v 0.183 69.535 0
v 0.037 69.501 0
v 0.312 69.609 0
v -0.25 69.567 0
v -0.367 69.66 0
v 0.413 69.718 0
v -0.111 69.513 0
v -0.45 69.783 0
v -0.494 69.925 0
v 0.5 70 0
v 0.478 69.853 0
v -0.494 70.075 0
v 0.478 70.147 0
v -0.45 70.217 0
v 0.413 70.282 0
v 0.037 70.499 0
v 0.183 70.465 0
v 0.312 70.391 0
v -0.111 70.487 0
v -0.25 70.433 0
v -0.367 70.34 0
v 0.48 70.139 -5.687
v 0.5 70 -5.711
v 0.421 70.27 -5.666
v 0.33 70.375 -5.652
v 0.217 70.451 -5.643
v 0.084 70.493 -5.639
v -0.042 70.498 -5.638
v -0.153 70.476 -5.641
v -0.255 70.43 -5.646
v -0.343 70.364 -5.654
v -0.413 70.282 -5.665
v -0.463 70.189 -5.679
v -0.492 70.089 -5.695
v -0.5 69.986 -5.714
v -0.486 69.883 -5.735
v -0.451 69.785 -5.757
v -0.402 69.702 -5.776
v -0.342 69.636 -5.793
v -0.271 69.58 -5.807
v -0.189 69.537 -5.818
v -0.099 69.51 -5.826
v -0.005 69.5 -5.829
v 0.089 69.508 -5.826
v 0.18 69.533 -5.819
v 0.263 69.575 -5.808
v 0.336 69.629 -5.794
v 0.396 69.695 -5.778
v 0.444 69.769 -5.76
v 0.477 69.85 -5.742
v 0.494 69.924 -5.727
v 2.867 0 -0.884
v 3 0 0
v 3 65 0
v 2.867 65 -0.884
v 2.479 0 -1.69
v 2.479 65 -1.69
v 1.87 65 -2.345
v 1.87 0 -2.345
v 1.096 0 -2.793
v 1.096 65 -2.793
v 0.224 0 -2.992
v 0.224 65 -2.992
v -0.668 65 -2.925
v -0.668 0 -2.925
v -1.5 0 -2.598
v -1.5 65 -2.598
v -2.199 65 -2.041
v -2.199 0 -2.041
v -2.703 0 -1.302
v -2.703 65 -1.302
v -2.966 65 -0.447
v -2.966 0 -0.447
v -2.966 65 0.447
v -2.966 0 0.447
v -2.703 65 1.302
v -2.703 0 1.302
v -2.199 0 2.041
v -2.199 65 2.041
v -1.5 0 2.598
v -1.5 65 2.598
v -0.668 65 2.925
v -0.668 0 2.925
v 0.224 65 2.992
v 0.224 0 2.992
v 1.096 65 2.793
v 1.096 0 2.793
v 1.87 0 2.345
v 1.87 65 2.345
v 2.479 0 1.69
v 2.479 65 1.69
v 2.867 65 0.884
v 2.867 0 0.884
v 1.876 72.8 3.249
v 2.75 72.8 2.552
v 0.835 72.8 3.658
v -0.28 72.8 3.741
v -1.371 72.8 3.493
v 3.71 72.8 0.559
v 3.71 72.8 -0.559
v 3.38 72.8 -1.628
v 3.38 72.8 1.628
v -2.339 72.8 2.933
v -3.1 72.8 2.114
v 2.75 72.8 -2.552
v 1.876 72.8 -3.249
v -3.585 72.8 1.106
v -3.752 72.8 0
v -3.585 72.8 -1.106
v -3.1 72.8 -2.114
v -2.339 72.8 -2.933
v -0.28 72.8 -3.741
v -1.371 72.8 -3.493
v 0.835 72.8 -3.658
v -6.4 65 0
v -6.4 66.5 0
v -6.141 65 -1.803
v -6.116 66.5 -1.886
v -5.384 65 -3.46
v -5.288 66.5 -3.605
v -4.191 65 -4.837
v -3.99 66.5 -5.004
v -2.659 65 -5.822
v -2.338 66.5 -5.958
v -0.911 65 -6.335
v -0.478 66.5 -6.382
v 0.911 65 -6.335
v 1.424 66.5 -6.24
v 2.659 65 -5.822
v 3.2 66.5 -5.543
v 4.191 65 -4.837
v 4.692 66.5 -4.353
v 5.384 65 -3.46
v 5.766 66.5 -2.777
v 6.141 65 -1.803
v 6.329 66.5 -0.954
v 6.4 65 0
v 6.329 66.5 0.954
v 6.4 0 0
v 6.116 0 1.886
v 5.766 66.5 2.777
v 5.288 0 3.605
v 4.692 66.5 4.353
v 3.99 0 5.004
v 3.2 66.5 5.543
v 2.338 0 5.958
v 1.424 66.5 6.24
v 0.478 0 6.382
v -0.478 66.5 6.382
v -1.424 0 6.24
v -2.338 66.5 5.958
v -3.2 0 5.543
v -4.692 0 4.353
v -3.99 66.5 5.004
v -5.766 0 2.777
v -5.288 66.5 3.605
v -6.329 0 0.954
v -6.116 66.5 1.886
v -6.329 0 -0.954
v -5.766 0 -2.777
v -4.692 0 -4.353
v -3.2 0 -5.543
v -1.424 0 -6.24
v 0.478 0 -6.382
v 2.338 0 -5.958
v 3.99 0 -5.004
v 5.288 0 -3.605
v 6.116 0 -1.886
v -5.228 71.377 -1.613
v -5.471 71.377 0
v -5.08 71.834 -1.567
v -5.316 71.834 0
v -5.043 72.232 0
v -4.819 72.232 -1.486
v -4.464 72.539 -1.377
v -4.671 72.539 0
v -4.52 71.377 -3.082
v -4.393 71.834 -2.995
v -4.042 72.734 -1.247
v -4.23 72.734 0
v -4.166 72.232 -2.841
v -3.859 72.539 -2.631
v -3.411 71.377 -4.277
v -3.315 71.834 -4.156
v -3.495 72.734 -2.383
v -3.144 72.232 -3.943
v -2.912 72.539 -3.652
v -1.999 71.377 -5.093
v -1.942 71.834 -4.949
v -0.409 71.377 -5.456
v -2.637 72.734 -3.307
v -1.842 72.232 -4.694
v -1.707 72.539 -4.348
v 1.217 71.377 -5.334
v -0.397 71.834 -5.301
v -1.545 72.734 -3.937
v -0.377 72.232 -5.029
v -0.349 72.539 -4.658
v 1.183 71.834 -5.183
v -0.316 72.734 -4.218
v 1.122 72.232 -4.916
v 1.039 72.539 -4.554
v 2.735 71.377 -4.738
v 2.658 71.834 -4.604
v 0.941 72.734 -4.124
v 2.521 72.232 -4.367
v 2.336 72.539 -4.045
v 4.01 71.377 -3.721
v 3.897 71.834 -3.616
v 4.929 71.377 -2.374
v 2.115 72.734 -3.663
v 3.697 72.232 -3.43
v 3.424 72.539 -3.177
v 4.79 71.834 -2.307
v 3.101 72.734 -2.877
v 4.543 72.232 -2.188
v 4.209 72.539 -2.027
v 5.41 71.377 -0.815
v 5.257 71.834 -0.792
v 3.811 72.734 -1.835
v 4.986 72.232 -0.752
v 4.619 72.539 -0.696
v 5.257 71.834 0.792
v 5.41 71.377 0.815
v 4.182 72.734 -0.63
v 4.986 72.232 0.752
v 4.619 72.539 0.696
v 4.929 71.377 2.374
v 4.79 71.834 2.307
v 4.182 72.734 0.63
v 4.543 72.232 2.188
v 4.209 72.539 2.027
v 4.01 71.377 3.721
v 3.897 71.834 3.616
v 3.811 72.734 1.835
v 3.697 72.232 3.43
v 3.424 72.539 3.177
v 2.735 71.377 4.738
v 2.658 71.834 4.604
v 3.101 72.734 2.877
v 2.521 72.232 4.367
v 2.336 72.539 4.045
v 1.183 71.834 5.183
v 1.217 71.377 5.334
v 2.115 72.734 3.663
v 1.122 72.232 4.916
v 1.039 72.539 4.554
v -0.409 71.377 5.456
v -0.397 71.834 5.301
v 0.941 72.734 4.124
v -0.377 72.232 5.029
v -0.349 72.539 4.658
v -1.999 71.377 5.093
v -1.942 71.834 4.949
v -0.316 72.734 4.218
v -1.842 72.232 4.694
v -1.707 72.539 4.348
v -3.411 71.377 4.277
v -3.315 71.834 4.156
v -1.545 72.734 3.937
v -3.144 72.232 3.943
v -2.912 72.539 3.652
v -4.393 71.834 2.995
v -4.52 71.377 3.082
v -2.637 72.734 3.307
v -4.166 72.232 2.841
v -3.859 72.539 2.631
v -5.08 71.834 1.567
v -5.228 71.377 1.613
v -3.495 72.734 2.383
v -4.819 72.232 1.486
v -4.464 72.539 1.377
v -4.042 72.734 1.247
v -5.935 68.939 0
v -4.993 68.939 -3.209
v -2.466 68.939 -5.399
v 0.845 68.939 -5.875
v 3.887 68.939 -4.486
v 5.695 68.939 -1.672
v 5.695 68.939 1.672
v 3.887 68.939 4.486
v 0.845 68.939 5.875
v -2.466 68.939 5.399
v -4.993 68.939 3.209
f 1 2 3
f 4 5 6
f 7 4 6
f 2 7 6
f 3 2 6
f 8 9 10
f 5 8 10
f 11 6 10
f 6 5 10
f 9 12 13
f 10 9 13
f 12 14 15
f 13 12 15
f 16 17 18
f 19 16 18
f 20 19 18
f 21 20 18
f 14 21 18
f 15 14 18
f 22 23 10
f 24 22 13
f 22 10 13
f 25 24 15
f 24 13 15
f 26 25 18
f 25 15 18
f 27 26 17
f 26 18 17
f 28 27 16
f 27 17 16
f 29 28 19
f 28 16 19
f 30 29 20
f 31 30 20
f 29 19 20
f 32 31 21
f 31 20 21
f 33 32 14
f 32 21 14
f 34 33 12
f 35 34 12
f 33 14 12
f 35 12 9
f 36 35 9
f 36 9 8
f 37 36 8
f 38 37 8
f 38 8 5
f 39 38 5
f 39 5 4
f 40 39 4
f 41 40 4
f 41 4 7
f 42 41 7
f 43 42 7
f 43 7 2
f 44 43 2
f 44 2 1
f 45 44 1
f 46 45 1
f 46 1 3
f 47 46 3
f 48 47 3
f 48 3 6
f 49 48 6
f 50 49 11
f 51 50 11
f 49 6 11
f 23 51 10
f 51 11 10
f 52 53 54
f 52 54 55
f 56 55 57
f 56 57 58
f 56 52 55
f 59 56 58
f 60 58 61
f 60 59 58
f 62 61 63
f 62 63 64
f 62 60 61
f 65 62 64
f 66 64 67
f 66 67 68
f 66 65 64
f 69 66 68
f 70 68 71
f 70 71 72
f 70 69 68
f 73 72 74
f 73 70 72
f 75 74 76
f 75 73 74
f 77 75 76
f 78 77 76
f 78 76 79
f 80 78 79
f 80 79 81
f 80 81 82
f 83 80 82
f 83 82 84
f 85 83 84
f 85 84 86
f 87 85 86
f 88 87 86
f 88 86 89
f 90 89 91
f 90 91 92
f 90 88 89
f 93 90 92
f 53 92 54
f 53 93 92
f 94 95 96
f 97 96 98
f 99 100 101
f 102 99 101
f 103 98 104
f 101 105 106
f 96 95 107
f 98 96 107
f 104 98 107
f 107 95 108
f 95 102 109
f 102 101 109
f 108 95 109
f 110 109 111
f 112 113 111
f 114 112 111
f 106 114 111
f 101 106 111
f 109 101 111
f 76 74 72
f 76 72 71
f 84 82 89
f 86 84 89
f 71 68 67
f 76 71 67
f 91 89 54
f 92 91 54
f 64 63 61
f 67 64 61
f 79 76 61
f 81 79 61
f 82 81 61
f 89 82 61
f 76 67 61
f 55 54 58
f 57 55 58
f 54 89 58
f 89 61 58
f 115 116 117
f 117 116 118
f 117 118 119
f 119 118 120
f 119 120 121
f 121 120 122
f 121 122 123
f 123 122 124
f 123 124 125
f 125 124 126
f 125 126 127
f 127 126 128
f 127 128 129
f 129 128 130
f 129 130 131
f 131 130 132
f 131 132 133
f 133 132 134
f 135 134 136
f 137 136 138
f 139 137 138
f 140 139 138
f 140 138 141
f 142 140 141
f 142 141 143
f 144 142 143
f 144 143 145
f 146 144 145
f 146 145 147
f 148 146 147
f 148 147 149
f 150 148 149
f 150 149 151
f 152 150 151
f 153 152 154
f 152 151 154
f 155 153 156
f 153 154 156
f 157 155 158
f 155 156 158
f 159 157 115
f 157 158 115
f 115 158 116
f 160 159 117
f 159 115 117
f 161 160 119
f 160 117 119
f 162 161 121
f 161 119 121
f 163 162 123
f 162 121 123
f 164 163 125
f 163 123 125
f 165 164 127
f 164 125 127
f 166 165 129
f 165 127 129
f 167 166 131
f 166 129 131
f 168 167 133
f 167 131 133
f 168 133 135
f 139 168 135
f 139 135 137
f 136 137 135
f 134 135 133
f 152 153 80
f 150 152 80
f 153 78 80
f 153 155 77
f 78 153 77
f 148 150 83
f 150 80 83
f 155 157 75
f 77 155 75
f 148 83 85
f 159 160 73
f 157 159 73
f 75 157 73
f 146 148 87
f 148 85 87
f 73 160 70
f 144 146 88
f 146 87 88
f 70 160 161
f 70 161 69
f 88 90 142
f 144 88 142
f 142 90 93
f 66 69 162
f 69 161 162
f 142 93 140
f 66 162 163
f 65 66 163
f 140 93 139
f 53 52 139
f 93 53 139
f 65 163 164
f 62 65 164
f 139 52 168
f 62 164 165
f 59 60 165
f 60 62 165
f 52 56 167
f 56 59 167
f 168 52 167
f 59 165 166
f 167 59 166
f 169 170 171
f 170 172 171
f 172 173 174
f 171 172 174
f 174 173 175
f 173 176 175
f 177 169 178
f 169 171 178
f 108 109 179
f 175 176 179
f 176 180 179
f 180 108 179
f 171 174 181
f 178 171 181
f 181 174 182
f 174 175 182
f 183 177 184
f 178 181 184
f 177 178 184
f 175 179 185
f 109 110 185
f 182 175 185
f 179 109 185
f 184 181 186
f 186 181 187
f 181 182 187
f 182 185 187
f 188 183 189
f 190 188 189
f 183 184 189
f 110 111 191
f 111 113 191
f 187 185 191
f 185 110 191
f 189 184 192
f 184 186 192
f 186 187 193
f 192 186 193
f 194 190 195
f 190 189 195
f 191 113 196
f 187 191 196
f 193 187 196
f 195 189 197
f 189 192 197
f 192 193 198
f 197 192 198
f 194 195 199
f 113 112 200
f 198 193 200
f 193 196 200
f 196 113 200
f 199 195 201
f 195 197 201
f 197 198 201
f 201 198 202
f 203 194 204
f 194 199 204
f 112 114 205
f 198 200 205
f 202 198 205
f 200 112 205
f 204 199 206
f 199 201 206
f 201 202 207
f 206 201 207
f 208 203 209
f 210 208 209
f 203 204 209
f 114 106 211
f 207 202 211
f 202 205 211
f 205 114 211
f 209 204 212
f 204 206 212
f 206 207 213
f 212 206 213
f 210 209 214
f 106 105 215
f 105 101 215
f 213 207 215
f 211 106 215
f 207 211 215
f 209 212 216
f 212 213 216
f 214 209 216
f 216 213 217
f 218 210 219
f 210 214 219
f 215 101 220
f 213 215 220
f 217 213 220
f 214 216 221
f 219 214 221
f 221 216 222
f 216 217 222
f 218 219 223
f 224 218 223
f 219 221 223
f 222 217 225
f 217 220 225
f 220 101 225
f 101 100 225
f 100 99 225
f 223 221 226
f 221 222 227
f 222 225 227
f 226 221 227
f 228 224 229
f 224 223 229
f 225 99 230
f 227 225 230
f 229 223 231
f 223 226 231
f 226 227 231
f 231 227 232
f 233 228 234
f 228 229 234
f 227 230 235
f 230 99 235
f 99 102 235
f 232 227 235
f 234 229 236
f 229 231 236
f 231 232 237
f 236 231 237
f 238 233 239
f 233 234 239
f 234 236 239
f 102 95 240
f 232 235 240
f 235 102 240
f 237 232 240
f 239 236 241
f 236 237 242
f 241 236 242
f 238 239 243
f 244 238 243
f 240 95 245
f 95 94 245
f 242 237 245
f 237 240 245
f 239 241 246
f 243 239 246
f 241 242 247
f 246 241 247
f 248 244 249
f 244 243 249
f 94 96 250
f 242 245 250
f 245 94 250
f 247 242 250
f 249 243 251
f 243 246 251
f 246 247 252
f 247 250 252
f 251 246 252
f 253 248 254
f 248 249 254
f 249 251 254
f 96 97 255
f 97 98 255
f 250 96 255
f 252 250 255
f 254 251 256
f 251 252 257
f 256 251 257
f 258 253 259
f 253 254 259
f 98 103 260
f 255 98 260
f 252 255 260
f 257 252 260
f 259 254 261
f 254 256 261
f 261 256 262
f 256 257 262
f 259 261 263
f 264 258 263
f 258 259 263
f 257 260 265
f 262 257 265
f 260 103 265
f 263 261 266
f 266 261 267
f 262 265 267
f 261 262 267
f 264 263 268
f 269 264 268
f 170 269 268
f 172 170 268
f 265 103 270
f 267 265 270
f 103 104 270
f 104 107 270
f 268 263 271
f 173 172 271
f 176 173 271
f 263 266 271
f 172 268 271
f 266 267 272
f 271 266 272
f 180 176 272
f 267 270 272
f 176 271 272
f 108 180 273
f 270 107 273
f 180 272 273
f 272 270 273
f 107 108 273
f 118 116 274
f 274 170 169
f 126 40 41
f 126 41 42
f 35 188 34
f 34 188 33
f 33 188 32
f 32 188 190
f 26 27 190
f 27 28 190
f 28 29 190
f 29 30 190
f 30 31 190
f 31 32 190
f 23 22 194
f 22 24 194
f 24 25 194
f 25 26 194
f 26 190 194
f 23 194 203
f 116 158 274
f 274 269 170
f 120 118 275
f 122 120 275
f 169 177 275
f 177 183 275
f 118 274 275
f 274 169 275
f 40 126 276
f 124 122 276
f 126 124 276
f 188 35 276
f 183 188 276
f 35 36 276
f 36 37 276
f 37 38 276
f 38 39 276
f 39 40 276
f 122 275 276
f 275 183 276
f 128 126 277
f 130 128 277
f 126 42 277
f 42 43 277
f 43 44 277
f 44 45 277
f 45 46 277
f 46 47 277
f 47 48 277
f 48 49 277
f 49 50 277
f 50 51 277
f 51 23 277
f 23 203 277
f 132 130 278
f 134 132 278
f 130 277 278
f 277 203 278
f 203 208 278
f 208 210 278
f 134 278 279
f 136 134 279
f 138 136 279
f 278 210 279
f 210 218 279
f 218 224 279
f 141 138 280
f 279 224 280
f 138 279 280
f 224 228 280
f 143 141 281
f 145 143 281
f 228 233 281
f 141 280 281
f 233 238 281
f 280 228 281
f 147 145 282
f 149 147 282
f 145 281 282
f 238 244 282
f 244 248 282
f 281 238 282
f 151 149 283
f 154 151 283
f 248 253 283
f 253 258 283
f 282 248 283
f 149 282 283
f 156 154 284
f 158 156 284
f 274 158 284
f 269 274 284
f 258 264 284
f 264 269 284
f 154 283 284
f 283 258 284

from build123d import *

# Parameters (mm, degrees)
SKETCH1_R           = 6.4
SKETCH1_R_2         = 3
BOSS_EXTRUDE2_DEPTH = 65
SKETCH4_R           = 0.5
CUT_EXTRUDE1_DEPTH  = 7.4


with BuildPart() as part:
    # Sketch1 → Boss-Extrude2 (new body)
    with BuildSketch(Plane(origin=(0, 0, 0), x_dir=(1, 0, 0), z_dir=(0, 1, 0))):
        Circle(SKETCH1_R)
        Circle(SKETCH1_R_2, mode=Mode.SUBTRACT)
    extrude(amount=BOSS_EXTRUDE2_DEPTH)

    # Sketch2 → Revolve2 (revolve)
    with BuildSketch(Plane.XY):
        with BuildLine():
            Line((-6.4, 65), (-6.4, 66.5))
            Line((-6.4, 66.5), (-5.470962631, 71.377446189))
            ThreePointArc((-5.470962631, 71.377446189), (-4.867546878, 72.39824531), (-3.751870139, 72.8))
            Line((-3.751870139, 72.8), (0, 72.8))
            Line((0, 72.8), (0, 65))
            Line((0, 65), (-6.4, 65))
        make_face()
    revolve(axis=Axis((0, 72.8, 0), (0, -1, 0)))

    # Sketch4 → Cut-Extrude1 (cut, through all)
    with BuildSketch(Plane.XY):
        with Locations((0, 70)):
            Circle(SKETCH4_R)
    extrude(amount=-CUT_EXTRUDE1_DEPTH, mode=Mode.SUBTRACT)


solid = part.part
